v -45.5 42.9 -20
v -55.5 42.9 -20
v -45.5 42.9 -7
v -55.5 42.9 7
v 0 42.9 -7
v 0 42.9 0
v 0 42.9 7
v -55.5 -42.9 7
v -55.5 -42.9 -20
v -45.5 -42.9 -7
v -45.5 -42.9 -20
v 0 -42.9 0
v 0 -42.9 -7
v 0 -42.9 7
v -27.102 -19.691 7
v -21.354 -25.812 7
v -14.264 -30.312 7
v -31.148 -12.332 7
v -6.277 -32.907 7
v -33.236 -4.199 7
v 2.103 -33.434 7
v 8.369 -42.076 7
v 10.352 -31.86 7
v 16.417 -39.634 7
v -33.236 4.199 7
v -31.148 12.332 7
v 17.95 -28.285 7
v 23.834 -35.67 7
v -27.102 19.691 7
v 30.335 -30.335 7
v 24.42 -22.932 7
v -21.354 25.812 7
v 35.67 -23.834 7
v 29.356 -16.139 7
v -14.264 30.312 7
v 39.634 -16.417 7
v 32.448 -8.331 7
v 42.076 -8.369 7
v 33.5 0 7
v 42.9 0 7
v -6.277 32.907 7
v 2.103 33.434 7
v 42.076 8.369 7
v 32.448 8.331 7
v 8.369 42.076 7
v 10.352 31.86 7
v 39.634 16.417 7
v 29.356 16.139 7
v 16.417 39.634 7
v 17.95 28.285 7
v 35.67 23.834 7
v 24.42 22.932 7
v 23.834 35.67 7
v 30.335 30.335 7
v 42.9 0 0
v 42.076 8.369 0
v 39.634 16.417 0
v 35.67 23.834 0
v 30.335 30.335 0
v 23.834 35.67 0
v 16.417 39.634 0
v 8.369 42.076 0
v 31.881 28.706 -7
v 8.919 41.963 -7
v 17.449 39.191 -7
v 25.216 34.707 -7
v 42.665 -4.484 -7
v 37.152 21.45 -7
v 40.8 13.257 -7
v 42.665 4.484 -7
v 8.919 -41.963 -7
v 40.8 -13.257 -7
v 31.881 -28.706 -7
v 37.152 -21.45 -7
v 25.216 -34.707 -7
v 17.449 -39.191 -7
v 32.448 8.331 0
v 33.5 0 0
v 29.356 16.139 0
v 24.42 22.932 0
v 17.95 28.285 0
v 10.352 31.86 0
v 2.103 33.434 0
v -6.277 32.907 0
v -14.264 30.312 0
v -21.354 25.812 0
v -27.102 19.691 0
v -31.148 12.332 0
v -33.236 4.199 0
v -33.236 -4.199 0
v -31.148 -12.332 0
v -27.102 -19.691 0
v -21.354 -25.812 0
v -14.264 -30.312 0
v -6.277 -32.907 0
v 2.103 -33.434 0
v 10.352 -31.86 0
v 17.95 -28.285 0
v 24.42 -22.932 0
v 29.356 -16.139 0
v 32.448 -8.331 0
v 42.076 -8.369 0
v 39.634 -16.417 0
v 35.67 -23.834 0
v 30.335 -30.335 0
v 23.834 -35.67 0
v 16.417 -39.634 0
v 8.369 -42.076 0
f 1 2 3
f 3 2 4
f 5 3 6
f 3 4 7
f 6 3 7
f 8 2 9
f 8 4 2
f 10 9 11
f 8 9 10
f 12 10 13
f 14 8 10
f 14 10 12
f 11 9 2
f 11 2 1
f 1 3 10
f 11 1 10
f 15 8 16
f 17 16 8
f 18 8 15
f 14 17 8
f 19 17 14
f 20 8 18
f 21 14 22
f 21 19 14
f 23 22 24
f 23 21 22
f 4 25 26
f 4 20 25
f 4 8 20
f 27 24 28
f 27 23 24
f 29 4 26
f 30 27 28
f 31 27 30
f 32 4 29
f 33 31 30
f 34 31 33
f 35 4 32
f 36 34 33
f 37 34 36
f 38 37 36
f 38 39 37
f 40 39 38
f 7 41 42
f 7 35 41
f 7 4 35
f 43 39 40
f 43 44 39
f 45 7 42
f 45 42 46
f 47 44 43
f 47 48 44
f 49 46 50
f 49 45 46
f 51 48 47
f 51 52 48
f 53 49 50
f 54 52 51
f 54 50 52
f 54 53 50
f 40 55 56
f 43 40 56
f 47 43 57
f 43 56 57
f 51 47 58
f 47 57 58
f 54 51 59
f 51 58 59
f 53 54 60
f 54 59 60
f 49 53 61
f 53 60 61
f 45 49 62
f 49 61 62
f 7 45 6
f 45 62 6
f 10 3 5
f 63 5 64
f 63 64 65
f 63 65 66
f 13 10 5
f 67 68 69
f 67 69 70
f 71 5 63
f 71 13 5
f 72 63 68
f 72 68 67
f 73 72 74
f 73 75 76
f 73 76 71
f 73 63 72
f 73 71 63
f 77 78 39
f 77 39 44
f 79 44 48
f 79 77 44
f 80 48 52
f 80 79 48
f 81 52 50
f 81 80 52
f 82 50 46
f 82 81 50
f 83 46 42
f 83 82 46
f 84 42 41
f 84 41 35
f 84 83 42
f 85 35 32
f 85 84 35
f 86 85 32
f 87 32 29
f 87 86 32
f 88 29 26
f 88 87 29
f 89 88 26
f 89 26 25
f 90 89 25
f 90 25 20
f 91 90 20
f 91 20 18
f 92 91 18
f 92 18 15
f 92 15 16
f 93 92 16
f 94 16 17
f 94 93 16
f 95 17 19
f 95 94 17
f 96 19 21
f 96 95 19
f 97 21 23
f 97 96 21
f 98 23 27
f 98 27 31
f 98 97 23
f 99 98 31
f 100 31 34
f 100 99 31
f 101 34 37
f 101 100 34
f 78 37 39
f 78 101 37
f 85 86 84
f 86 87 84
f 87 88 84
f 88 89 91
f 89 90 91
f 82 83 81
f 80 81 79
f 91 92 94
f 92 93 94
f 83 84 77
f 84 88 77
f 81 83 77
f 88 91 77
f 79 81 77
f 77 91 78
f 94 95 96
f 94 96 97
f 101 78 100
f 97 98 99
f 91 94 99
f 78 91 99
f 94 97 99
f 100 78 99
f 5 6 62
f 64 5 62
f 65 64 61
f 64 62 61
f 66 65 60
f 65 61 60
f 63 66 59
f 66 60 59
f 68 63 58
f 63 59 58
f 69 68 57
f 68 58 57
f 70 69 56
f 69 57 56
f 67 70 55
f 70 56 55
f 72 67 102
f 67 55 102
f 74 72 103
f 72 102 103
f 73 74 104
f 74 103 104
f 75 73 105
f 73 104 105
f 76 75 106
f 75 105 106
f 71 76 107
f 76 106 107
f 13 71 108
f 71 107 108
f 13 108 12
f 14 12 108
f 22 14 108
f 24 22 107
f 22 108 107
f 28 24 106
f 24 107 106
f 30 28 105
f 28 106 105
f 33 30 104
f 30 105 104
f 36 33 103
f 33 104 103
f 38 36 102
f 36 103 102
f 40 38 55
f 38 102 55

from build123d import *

# Parameters (mm, degrees)
F0_R     = 33.5
F1_DEPTH = 7
F3_DEPTH = 7
F4_W     = 10
F4_H     = 85.8
F5_DEPTH = 13


with BuildPart() as f1:
    # F0 (on Top) → F1 (new body)
    with BuildSketch(Plane.XY):
        with BuildLine():
            ThreePointArc((0, -42.9), (-42.9, 0), (0, 42.9))
            Line((0, 42.9), (-55.5, 42.9))
            Line((-55.5, 42.9), (-55.5, -42.9))
            Line((-55.5, -42.9), (0, -42.9))
        make_face()
        with BuildLine():
            ThreePointArc((0, -42.9), (30.334881, -30.334881), (42.9, 0))
            ThreePointArc((42.9, 0), (30.334881, 30.334881), (0, 42.9))
            ThreePointArc((0, 42.9), (-42.9, 0), (0, -42.9))
        make_face()
        Circle(F0_R, mode=Mode.SUBTRACT)
    extrude(amount=F1_DEPTH)

    # F2 (on face) → F3 (join)
    with BuildSketch(Plane(origin=(0, 0, 0), x_dir=(1, 0, 0), z_dir=(0, 0, -1))):
        with BuildLine():
            Line((-55.5, -42.9), (0, -42.9))
            ThreePointArc((0, -42.9), (42.9, 0), (0, 42.9))
            Line((0, 42.9), (-55.5, 42.9))
            Line((-55.5, 42.9), (-55.5, -42.9))
        make_face()
    extrude(amount=F3_DEPTH)

    # F4 (on face) → F5 (join)
    with BuildSketch(Plane(origin=(0, 0, -7), x_dir=(1, 0, 0), z_dir=(0, 0, -1))):
        with Locations((-50.5, 0)):
            Rectangle(F4_W, F4_H)
    extrude(amount=F5_DEPTH)


solid = f1.part
